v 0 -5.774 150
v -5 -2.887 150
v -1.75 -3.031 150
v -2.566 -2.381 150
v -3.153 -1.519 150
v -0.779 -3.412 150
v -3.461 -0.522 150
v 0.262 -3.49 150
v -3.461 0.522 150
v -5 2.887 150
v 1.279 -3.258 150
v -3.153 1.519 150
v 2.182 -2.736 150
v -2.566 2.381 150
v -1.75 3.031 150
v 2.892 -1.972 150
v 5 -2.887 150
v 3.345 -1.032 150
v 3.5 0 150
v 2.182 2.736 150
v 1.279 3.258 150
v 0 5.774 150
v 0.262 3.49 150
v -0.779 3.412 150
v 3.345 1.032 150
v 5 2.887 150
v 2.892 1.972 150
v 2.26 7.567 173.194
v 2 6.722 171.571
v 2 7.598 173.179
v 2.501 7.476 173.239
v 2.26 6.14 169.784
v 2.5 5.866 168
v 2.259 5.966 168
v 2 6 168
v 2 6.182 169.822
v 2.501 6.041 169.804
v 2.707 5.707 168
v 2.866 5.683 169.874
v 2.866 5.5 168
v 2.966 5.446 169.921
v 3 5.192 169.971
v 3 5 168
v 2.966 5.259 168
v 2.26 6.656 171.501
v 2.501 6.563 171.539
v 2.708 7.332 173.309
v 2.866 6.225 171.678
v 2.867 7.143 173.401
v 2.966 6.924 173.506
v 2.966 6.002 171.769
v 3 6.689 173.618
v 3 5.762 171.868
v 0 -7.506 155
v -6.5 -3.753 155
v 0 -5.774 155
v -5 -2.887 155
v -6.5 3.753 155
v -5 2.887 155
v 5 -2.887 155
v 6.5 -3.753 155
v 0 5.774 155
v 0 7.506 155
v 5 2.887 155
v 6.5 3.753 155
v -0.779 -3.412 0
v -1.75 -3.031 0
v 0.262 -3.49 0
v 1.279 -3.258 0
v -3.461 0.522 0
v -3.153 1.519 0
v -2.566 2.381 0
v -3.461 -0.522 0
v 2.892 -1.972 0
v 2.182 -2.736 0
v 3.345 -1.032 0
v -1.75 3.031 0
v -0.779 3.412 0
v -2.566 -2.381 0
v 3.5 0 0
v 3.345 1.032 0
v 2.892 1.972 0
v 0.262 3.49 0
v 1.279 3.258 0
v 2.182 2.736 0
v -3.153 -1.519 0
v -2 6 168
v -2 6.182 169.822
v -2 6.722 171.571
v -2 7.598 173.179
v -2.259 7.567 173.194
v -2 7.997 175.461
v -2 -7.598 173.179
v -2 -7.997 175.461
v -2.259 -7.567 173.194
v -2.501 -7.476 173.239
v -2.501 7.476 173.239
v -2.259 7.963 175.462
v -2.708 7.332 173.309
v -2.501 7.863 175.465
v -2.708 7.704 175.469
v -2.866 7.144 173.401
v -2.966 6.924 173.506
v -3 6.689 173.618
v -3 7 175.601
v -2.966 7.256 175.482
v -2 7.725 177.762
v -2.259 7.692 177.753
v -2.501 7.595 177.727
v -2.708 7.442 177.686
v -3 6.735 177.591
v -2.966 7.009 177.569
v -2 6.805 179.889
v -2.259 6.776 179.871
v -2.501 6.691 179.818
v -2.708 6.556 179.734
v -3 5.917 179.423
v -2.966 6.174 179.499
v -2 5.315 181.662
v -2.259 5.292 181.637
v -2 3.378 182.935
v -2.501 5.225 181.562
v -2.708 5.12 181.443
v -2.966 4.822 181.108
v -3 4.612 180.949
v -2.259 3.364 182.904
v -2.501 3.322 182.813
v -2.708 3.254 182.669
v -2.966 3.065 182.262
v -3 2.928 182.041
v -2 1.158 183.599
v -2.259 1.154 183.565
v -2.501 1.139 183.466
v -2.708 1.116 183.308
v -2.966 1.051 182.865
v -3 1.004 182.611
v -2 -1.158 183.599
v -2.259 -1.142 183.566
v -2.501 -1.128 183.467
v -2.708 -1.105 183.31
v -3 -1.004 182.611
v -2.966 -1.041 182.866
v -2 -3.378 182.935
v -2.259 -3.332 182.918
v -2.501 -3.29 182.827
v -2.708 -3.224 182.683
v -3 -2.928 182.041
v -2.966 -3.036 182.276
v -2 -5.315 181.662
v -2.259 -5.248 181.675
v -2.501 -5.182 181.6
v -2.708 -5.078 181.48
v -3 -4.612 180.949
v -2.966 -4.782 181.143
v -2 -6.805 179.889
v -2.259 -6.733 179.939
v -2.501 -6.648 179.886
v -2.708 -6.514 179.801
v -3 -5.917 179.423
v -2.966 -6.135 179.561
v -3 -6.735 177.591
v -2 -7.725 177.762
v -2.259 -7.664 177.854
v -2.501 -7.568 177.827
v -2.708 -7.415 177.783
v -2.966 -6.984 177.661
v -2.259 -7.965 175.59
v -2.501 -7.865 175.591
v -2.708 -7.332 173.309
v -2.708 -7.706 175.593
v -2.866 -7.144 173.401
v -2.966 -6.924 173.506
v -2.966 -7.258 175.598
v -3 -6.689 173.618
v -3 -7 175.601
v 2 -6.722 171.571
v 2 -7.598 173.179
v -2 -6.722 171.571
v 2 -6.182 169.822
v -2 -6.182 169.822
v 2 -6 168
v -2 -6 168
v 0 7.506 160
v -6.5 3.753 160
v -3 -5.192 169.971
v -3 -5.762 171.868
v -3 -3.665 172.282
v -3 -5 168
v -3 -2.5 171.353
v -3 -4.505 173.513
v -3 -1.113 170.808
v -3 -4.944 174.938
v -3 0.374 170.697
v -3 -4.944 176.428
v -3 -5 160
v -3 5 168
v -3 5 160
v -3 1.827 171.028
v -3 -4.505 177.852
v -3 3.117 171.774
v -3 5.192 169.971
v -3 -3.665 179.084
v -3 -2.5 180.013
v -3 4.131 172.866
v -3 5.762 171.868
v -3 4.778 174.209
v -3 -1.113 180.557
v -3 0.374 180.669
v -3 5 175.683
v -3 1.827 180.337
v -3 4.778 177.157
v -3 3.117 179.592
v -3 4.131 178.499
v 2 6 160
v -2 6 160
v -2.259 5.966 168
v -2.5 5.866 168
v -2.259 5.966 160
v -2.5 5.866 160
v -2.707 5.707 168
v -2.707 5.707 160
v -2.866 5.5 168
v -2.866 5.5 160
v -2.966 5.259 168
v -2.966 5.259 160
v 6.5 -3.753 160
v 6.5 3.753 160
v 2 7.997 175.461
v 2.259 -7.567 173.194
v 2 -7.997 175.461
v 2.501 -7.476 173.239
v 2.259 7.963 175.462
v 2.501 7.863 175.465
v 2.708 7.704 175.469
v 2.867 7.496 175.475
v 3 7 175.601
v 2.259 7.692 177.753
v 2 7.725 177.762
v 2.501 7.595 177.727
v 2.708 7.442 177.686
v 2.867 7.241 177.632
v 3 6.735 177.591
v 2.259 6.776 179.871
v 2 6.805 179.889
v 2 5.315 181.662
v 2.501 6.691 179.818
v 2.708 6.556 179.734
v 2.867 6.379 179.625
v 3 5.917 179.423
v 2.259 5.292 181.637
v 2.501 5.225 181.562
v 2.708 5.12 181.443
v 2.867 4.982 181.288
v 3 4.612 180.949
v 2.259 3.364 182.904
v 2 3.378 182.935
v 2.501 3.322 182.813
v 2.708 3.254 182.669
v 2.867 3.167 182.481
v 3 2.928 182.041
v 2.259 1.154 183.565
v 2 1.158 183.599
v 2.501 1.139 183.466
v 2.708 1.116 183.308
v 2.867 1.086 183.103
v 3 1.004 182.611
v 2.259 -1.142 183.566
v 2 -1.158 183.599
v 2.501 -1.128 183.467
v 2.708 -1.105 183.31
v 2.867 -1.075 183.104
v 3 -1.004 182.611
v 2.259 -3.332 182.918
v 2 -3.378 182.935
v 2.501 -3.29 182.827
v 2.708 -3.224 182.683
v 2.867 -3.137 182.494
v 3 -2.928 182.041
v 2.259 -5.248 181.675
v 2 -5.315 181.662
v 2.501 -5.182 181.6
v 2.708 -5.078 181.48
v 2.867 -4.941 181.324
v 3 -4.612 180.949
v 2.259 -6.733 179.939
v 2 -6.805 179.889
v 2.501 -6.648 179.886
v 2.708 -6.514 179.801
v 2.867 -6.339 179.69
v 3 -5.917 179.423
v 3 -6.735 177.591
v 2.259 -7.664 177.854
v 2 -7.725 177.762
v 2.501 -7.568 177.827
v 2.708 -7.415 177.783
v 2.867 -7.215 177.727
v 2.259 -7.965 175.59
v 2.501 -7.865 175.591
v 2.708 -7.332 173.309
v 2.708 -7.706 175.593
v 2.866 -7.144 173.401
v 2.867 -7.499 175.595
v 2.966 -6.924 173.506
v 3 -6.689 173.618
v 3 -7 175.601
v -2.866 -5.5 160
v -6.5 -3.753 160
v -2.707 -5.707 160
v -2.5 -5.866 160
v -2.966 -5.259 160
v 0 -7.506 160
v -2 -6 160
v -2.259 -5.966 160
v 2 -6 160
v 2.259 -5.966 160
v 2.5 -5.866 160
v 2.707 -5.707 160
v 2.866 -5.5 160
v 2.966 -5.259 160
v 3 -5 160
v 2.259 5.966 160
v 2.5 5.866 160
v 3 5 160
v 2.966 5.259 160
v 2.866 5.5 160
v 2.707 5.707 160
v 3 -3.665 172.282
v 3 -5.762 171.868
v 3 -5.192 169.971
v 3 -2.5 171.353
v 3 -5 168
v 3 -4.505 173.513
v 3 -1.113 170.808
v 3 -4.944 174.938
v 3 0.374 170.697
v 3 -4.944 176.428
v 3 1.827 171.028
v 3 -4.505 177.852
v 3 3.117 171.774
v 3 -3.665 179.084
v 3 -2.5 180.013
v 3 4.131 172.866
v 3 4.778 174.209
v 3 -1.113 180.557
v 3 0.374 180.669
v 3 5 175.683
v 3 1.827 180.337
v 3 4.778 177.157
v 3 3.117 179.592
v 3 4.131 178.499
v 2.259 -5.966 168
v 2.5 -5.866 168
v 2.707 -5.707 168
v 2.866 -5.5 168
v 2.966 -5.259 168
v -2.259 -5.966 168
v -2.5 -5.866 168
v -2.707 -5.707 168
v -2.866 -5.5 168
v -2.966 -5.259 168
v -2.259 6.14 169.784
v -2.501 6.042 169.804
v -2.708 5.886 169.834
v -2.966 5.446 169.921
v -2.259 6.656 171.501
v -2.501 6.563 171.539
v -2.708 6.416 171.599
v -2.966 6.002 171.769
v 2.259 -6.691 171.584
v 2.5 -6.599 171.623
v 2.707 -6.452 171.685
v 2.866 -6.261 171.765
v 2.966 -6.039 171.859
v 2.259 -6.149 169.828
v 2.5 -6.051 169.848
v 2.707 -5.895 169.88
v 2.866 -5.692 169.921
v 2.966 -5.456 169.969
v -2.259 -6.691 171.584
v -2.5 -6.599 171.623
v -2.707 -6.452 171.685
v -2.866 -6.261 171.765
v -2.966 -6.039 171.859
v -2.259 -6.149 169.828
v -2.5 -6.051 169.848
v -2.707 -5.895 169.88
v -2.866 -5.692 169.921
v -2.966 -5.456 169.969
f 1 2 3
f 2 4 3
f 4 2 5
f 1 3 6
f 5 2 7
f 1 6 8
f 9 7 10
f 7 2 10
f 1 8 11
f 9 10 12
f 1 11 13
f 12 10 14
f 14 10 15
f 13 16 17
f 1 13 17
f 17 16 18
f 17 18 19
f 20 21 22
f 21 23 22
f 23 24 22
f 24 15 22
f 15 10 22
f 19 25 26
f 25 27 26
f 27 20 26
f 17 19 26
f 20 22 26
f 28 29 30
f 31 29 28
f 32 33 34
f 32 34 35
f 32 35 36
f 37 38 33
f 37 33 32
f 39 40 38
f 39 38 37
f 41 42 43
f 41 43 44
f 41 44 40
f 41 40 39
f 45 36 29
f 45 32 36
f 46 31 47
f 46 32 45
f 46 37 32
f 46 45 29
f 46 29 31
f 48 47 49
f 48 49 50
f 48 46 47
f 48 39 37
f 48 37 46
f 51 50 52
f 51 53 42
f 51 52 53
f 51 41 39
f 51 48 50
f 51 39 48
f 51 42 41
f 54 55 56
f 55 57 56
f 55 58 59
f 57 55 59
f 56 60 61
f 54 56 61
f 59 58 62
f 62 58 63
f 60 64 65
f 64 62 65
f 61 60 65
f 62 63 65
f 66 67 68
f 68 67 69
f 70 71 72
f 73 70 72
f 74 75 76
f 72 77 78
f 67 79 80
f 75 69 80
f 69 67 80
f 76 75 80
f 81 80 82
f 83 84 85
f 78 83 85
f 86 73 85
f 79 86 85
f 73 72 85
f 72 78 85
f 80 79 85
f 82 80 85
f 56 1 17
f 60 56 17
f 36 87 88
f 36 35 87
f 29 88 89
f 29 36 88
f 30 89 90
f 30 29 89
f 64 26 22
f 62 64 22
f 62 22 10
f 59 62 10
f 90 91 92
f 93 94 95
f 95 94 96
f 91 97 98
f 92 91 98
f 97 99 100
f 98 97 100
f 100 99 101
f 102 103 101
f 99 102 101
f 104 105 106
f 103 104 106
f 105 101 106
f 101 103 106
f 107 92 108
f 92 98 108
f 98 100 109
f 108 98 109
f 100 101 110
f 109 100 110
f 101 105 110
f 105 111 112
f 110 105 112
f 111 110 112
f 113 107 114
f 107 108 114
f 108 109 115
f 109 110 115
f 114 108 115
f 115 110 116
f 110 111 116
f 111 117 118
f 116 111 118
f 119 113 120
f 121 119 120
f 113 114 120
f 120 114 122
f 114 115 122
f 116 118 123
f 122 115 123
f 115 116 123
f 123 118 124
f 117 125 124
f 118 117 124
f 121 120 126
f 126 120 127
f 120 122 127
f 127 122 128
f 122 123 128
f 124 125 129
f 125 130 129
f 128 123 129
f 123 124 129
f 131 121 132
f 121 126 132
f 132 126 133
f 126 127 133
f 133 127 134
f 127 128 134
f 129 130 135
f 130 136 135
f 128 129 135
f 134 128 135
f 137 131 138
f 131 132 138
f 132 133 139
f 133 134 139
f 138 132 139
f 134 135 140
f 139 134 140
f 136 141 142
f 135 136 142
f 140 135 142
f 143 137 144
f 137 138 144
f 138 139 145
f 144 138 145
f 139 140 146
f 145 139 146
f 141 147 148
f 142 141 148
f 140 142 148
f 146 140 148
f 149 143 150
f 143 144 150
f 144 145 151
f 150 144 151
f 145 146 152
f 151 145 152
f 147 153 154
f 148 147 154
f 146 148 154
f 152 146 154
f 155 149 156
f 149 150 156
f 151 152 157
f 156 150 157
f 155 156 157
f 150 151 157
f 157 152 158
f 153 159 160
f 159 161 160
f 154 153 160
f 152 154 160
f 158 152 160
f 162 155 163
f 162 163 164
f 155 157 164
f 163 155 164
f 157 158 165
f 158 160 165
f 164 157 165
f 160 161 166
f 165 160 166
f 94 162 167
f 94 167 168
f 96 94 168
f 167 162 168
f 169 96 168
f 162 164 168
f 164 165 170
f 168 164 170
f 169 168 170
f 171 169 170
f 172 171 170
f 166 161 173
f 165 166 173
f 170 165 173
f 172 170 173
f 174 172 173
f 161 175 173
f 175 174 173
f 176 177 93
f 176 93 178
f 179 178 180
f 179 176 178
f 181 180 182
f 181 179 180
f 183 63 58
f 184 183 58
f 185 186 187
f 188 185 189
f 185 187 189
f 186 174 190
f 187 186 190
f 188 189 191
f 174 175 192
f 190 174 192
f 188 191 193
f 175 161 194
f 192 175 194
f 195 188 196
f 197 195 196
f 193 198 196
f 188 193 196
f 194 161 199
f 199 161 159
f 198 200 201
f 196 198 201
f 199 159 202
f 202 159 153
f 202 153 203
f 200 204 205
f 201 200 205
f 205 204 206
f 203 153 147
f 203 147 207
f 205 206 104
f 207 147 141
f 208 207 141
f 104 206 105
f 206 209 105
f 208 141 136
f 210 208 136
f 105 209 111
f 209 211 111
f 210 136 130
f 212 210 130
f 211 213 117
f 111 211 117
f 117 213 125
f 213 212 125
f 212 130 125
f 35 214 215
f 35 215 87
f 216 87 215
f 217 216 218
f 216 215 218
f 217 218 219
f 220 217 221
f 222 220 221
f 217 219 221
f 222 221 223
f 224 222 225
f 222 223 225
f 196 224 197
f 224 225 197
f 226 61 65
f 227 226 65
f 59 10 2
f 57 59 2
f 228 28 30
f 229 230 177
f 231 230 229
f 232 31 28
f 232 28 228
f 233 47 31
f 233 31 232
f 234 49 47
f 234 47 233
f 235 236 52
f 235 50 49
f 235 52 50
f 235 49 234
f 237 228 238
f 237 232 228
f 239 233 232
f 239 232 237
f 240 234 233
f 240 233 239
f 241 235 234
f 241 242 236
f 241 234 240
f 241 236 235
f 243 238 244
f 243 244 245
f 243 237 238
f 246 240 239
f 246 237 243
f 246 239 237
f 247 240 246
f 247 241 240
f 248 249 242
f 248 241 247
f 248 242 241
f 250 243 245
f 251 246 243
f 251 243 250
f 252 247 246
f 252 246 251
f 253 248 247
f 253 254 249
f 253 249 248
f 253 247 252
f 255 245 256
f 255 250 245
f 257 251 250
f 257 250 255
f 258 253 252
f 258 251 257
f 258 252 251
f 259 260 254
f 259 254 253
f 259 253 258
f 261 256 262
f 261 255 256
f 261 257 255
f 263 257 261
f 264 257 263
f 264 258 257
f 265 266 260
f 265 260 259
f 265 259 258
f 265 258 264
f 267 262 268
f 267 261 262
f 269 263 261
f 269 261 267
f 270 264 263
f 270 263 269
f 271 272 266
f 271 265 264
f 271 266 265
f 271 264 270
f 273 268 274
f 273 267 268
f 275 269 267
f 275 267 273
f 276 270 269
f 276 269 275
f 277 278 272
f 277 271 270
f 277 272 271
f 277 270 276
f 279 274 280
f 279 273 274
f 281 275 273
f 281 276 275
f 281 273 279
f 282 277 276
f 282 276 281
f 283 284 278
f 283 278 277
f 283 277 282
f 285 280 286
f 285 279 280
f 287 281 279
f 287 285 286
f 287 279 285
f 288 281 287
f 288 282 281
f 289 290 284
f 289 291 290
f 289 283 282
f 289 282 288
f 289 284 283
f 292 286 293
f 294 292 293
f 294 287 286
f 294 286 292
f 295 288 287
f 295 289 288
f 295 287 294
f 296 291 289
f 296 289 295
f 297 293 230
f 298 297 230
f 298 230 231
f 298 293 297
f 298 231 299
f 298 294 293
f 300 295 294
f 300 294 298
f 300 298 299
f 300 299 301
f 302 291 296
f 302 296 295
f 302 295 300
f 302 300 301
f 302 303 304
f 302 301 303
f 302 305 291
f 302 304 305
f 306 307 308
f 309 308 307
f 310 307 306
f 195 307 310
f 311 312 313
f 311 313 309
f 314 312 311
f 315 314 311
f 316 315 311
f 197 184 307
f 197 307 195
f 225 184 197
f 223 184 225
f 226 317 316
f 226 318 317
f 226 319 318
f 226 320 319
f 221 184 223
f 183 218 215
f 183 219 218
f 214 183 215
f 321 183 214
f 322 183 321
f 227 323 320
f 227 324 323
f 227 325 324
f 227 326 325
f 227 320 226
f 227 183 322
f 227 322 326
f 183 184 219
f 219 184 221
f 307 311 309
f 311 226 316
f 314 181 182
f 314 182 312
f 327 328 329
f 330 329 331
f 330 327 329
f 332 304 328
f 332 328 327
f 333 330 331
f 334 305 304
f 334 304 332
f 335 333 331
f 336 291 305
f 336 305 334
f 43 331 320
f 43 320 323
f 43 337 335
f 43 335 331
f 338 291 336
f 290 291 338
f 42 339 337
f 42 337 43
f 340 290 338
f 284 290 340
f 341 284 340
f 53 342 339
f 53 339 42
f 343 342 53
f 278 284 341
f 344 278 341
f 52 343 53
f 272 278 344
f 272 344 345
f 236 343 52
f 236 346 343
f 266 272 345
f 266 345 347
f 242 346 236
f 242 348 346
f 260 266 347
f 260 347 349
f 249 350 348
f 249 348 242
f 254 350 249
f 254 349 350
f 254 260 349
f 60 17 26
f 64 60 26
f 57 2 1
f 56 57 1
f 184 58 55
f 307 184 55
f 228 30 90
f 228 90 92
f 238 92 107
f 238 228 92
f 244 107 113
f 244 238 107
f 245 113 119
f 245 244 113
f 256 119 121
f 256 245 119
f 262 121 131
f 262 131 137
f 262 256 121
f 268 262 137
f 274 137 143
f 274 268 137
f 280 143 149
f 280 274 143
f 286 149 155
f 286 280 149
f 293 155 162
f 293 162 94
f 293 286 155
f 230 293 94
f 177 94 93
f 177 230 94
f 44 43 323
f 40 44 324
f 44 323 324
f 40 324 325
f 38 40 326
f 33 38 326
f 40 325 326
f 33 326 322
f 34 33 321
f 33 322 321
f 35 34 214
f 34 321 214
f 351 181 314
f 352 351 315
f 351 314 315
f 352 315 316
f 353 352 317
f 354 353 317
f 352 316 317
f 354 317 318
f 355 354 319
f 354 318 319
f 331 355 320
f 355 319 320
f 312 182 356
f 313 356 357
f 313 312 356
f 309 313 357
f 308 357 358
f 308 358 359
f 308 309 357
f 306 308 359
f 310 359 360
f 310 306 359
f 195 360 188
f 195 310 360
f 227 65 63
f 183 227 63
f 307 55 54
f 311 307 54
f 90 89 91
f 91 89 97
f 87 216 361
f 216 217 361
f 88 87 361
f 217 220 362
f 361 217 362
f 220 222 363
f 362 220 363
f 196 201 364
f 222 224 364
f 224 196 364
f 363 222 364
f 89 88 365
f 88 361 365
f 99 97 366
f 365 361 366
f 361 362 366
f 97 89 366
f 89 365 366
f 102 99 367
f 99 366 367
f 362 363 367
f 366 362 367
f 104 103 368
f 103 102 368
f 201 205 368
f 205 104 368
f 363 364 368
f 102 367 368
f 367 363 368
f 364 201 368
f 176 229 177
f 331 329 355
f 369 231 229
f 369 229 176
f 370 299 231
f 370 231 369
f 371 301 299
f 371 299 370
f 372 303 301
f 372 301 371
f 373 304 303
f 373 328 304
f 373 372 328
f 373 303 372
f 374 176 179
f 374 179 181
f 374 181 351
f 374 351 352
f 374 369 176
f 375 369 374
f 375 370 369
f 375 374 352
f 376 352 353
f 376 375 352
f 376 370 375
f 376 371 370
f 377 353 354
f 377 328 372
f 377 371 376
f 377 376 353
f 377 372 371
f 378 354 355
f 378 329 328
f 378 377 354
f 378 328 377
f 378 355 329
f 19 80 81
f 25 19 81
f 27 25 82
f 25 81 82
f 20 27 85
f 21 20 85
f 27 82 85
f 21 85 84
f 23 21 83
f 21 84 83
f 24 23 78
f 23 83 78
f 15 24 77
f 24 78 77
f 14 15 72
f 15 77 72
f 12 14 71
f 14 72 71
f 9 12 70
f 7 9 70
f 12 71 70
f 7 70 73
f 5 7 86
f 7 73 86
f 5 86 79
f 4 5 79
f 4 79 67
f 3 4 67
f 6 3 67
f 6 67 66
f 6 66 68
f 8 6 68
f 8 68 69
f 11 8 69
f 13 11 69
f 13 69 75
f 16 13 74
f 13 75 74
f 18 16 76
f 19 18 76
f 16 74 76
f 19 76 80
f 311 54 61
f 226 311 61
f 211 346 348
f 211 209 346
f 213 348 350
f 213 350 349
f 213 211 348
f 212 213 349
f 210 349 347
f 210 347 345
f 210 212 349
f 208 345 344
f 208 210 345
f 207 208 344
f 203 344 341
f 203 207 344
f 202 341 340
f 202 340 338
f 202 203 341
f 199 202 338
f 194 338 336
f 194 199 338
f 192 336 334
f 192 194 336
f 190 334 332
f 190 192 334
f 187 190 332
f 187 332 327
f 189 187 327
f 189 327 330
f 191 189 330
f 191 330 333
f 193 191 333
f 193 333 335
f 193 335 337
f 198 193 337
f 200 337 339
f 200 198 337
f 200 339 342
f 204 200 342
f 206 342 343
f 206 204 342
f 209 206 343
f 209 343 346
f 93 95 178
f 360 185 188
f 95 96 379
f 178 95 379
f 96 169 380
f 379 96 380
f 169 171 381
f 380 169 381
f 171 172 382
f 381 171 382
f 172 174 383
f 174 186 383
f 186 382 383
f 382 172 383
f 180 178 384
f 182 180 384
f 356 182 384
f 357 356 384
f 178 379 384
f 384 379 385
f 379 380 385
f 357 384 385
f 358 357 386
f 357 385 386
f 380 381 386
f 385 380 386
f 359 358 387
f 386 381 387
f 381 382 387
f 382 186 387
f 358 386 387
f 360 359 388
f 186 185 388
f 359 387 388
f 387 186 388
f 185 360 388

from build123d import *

# Parameters (mm, degrees)
F0_R         = 3.5
F1_DEPTH     = 150
F3_DEPTH     = 5
F5_DEPTH     = 5
F6_R         = 5
F7_DEPTH     = 3
F8_F1_R      = 1
F8_F2_R      = 1
F8_T3_DEPTH  = 8
F8_T6_ANGLE  = 74.8218835265
F8_T7_DEPTH  = 8
F8_T10_ANGLE = 74.8218835265
F8_T11_DEPTH = 8
F8_T14_ANGLE = 74.8218835265
F8_T15_DEPTH = 8
F8_T18_ANGLE = 74.8218835265


# Not quite as in the source:
# - a fillet or chamfer that OpenCascade refuses, or shapes differently, is made with other operations: its cross-section is extruded or revolved along the edge and cut away or added


with BuildPart() as f1:
    # F0 (on Top) → F1 (new body)
    with BuildSketch(Plane.XY):
        Circle(F0_R)
    extrude(amount=F1_DEPTH)

    # F2 (on face) → F3 (join)
    with BuildSketch(Plane.XY.offset(150)):
        Polygon((5, -2.8867513459), (5, 2.8867513459), (0, 5.7735026919), (-5, 2.8867513459), (-5, -2.8867513459), (0, -5.7735026919), align=None)
    extrude(amount=F3_DEPTH)

    # F4 (on face) → F5 (join)
    with BuildSketch(Plane.XY.offset(155)):
        Polygon((6.5, -3.7527767497), (6.5, 3.7527767497), (0, 7.5055534995), (-6.5, 3.7527767497), (-6.5, -3.7527767497), (0, -7.5055534995), align=None)
    extrude(amount=F5_DEPTH)

    # F6 (on Right) → F7 (join, symmetric)
    with BuildSketch(Plane.YZ):
        with BuildLine():
            ThreePointArc((6, 168), (6.4085678246, 170.709769965), (7.5979446603, 173.1786084922))
            ThreePointArc((7.5979446603, 173.1786084922), (0, 183.6828522781), (-7.5979446603, 173.1786084922))
            ThreePointArc((-7.5979446603, 173.1786084922), (-6.4085678246, 170.709769965), (-6, 168))
            Line((-6, 168), (-6, 160))
            Line((-6, 160), (0, 160))
            Line((0, 160), (6, 160))
            Line((6, 160), (6, 168))
        make_face()
        with Locations((0, 175.6828522781)):
            Circle(F6_R, mode=Mode.SUBTRACT)
    extrude(amount=F7_DEPTH, both=True)

    # F8: fillet of radius 1 on 10 edges, made by hand

    # F8_f1
    f8_f1_edges = [f1.edges().sort_by_distance(p)[0] for p in [
        (3, 0, 183.6828522781),
    ]]
    fillet(f8_f1_edges, radius=F8_F1_R)

    # F8_f2
    f8_f2_edges = [f1.edges().sort_by_distance(p)[0] for p in [
        (-3, 0, 183.6828522781),
    ]]
    fillet(f8_f2_edges, radius=F8_F2_R)

    # F8_s4 → F8_t3 (cut)
    with BuildSketch(Plane.XY.offset(160)):
        with BuildLine():
            ThreePointArc((3, 5), (2.7071067812, 5.7071067812), (2, 6))
            Line((2, 6), (2, 6.02))
            Line((2, 6.02), (3.02, 6.02))
            Line((3.02, 6.02), (3.02, 5))
            Line((3.02, 5), (3, 5))
        make_face()
    extrude(amount=F8_T3_DEPTH, mode=Mode.SUBTRACT)

    # F8_s5 → F8_t6 (revolve, cut)
    with BuildSketch(Plane.XY.offset(168)):
        with BuildLine():
            ThreePointArc((2, 6), (2.7071067812, 5.7071067812), (3, 5))
            Line((3, 5), (3.02, 5))
            Line((3.02, 5), (3.02, 6.02))
            Line((3.02, 6.02), (2, 6.02))
            Line((2, 6.02), (2, 6))
        make_face()
    revolve(axis=Axis((3, 15.190372415, 168), (-1, 0, 0)), revolution_arc=F8_T6_ANGLE, mode=Mode.SUBTRACT)

    # F8_s8 → F8_t7 (cut)
    with BuildSketch(Plane.XY.offset(160)):
        with BuildLine():
            ThreePointArc((-2, 6), (-2.7071067812, 5.7071067812), (-3, 5))
            Line((-3, 5), (-3.02, 5))
            Line((-3.02, 5), (-3.02, 6.02))
            Line((-3.02, 6.02), (-2, 6.02))
            Line((-2, 6.02), (-2, 6))
        make_face()
    extrude(amount=F8_T7_DEPTH, mode=Mode.SUBTRACT)

    # F8_s9 → F8_t10 (revolve, cut)
    with BuildSketch(Plane.XY.offset(168)):
        with BuildLine():
            ThreePointArc((-2, 6), (-2.7071067812, 5.7071067812), (-3, 5))
            Line((-3, 5), (-3.02, 5))
            Line((-3.02, 5), (-3.02, 6.02))
            Line((-3.02, 6.02), (-2, 6.02))
            Line((-2, 6.02), (-2, 6))
        make_face()
    revolve(axis=Axis((-3, 15.190372415, 168), (-1, 0, 0)), revolution_arc=F8_T10_ANGLE, mode=Mode.SUBTRACT)

    # F8_s12 → F8_t11 (cut)
    with BuildSketch(Plane.XY.offset(160)):
        with BuildLine():
            ThreePointArc((-2, -6), (-2.7071067812, -5.7071067812), (-3, -5))
            Line((-3, -5), (-3.02, -5))
            Line((-3.02, -5), (-3.02, -6.02))
            Line((-3.02, -6.02), (-2, -6.02))
            Line((-2, -6.02), (-2, -6))
        make_face()
    extrude(amount=F8_T11_DEPTH, mode=Mode.SUBTRACT)

    # F8_s13 → F8_t14 (revolve, cut)
    with BuildSketch(Plane(origin=(0, -56.6005519955, 15.3548182499), x_dir=(1, 0, 0), z_dir=(0, -0.9651165645, 0.2618205815))):
        with BuildLine():
            ThreePointArc((-2, 167.3528031133), (-2.7071067812, 167.6456963322), (-3, 168.3528031133))
            Line((-3, 168.3528031133), (-3.02, 168.3528031133))
            Line((-3.02, 168.3528031133), (-3.02, 167.3328031133))
            Line((-3.02, 167.3328031133), (-2, 167.3328031133))
            Line((-2, 167.3328031133), (-2, 167.3528031133))
        make_face()
    revolve(axis=Axis((-3, -15.190372415, 168), (-1, 0, 0)), revolution_arc=F8_T14_ANGLE, mode=Mode.SUBTRACT)

    # F8_s16 → F8_t15 (cut)
    with BuildSketch(Plane.XY.offset(160)):
        with BuildLine():
            ThreePointArc((2, -6), (2.7071067812, -5.7071067812), (3, -5))
            Line((3, -5), (3.02, -5))
            Line((3.02, -5), (3.02, -6.02))
            Line((3.02, -6.02), (2, -6.02))
            Line((2, -6.02), (2, -6))
        make_face()
    extrude(amount=F8_T15_DEPTH, mode=Mode.SUBTRACT)

    # F8_s17 → F8_t18 (revolve, cut)
    with BuildSketch(Plane(origin=(0, -56.6005519955, 15.3548182499), x_dir=(1, 0, 0), z_dir=(0, -0.9651165645, 0.2618205815))):
        with BuildLine():
            ThreePointArc((2, 167.3528031133), (2.7071067812, 167.6456963322), (3, 168.3528031133))
            Line((3, 168.3528031133), (3.02, 168.3528031133))
            Line((3.02, 168.3528031133), (3.02, 167.3328031133))
            Line((3.02, 167.3328031133), (2, 167.3328031133))
            Line((2, 167.3328031133), (2, 167.3528031133))
        make_face()
    revolve(axis=Axis((3, -15.190372415, 168), (-1, 0, 0)), revolution_arc=F8_T18_ANGLE, mode=Mode.SUBTRACT)


solid = f1.part
